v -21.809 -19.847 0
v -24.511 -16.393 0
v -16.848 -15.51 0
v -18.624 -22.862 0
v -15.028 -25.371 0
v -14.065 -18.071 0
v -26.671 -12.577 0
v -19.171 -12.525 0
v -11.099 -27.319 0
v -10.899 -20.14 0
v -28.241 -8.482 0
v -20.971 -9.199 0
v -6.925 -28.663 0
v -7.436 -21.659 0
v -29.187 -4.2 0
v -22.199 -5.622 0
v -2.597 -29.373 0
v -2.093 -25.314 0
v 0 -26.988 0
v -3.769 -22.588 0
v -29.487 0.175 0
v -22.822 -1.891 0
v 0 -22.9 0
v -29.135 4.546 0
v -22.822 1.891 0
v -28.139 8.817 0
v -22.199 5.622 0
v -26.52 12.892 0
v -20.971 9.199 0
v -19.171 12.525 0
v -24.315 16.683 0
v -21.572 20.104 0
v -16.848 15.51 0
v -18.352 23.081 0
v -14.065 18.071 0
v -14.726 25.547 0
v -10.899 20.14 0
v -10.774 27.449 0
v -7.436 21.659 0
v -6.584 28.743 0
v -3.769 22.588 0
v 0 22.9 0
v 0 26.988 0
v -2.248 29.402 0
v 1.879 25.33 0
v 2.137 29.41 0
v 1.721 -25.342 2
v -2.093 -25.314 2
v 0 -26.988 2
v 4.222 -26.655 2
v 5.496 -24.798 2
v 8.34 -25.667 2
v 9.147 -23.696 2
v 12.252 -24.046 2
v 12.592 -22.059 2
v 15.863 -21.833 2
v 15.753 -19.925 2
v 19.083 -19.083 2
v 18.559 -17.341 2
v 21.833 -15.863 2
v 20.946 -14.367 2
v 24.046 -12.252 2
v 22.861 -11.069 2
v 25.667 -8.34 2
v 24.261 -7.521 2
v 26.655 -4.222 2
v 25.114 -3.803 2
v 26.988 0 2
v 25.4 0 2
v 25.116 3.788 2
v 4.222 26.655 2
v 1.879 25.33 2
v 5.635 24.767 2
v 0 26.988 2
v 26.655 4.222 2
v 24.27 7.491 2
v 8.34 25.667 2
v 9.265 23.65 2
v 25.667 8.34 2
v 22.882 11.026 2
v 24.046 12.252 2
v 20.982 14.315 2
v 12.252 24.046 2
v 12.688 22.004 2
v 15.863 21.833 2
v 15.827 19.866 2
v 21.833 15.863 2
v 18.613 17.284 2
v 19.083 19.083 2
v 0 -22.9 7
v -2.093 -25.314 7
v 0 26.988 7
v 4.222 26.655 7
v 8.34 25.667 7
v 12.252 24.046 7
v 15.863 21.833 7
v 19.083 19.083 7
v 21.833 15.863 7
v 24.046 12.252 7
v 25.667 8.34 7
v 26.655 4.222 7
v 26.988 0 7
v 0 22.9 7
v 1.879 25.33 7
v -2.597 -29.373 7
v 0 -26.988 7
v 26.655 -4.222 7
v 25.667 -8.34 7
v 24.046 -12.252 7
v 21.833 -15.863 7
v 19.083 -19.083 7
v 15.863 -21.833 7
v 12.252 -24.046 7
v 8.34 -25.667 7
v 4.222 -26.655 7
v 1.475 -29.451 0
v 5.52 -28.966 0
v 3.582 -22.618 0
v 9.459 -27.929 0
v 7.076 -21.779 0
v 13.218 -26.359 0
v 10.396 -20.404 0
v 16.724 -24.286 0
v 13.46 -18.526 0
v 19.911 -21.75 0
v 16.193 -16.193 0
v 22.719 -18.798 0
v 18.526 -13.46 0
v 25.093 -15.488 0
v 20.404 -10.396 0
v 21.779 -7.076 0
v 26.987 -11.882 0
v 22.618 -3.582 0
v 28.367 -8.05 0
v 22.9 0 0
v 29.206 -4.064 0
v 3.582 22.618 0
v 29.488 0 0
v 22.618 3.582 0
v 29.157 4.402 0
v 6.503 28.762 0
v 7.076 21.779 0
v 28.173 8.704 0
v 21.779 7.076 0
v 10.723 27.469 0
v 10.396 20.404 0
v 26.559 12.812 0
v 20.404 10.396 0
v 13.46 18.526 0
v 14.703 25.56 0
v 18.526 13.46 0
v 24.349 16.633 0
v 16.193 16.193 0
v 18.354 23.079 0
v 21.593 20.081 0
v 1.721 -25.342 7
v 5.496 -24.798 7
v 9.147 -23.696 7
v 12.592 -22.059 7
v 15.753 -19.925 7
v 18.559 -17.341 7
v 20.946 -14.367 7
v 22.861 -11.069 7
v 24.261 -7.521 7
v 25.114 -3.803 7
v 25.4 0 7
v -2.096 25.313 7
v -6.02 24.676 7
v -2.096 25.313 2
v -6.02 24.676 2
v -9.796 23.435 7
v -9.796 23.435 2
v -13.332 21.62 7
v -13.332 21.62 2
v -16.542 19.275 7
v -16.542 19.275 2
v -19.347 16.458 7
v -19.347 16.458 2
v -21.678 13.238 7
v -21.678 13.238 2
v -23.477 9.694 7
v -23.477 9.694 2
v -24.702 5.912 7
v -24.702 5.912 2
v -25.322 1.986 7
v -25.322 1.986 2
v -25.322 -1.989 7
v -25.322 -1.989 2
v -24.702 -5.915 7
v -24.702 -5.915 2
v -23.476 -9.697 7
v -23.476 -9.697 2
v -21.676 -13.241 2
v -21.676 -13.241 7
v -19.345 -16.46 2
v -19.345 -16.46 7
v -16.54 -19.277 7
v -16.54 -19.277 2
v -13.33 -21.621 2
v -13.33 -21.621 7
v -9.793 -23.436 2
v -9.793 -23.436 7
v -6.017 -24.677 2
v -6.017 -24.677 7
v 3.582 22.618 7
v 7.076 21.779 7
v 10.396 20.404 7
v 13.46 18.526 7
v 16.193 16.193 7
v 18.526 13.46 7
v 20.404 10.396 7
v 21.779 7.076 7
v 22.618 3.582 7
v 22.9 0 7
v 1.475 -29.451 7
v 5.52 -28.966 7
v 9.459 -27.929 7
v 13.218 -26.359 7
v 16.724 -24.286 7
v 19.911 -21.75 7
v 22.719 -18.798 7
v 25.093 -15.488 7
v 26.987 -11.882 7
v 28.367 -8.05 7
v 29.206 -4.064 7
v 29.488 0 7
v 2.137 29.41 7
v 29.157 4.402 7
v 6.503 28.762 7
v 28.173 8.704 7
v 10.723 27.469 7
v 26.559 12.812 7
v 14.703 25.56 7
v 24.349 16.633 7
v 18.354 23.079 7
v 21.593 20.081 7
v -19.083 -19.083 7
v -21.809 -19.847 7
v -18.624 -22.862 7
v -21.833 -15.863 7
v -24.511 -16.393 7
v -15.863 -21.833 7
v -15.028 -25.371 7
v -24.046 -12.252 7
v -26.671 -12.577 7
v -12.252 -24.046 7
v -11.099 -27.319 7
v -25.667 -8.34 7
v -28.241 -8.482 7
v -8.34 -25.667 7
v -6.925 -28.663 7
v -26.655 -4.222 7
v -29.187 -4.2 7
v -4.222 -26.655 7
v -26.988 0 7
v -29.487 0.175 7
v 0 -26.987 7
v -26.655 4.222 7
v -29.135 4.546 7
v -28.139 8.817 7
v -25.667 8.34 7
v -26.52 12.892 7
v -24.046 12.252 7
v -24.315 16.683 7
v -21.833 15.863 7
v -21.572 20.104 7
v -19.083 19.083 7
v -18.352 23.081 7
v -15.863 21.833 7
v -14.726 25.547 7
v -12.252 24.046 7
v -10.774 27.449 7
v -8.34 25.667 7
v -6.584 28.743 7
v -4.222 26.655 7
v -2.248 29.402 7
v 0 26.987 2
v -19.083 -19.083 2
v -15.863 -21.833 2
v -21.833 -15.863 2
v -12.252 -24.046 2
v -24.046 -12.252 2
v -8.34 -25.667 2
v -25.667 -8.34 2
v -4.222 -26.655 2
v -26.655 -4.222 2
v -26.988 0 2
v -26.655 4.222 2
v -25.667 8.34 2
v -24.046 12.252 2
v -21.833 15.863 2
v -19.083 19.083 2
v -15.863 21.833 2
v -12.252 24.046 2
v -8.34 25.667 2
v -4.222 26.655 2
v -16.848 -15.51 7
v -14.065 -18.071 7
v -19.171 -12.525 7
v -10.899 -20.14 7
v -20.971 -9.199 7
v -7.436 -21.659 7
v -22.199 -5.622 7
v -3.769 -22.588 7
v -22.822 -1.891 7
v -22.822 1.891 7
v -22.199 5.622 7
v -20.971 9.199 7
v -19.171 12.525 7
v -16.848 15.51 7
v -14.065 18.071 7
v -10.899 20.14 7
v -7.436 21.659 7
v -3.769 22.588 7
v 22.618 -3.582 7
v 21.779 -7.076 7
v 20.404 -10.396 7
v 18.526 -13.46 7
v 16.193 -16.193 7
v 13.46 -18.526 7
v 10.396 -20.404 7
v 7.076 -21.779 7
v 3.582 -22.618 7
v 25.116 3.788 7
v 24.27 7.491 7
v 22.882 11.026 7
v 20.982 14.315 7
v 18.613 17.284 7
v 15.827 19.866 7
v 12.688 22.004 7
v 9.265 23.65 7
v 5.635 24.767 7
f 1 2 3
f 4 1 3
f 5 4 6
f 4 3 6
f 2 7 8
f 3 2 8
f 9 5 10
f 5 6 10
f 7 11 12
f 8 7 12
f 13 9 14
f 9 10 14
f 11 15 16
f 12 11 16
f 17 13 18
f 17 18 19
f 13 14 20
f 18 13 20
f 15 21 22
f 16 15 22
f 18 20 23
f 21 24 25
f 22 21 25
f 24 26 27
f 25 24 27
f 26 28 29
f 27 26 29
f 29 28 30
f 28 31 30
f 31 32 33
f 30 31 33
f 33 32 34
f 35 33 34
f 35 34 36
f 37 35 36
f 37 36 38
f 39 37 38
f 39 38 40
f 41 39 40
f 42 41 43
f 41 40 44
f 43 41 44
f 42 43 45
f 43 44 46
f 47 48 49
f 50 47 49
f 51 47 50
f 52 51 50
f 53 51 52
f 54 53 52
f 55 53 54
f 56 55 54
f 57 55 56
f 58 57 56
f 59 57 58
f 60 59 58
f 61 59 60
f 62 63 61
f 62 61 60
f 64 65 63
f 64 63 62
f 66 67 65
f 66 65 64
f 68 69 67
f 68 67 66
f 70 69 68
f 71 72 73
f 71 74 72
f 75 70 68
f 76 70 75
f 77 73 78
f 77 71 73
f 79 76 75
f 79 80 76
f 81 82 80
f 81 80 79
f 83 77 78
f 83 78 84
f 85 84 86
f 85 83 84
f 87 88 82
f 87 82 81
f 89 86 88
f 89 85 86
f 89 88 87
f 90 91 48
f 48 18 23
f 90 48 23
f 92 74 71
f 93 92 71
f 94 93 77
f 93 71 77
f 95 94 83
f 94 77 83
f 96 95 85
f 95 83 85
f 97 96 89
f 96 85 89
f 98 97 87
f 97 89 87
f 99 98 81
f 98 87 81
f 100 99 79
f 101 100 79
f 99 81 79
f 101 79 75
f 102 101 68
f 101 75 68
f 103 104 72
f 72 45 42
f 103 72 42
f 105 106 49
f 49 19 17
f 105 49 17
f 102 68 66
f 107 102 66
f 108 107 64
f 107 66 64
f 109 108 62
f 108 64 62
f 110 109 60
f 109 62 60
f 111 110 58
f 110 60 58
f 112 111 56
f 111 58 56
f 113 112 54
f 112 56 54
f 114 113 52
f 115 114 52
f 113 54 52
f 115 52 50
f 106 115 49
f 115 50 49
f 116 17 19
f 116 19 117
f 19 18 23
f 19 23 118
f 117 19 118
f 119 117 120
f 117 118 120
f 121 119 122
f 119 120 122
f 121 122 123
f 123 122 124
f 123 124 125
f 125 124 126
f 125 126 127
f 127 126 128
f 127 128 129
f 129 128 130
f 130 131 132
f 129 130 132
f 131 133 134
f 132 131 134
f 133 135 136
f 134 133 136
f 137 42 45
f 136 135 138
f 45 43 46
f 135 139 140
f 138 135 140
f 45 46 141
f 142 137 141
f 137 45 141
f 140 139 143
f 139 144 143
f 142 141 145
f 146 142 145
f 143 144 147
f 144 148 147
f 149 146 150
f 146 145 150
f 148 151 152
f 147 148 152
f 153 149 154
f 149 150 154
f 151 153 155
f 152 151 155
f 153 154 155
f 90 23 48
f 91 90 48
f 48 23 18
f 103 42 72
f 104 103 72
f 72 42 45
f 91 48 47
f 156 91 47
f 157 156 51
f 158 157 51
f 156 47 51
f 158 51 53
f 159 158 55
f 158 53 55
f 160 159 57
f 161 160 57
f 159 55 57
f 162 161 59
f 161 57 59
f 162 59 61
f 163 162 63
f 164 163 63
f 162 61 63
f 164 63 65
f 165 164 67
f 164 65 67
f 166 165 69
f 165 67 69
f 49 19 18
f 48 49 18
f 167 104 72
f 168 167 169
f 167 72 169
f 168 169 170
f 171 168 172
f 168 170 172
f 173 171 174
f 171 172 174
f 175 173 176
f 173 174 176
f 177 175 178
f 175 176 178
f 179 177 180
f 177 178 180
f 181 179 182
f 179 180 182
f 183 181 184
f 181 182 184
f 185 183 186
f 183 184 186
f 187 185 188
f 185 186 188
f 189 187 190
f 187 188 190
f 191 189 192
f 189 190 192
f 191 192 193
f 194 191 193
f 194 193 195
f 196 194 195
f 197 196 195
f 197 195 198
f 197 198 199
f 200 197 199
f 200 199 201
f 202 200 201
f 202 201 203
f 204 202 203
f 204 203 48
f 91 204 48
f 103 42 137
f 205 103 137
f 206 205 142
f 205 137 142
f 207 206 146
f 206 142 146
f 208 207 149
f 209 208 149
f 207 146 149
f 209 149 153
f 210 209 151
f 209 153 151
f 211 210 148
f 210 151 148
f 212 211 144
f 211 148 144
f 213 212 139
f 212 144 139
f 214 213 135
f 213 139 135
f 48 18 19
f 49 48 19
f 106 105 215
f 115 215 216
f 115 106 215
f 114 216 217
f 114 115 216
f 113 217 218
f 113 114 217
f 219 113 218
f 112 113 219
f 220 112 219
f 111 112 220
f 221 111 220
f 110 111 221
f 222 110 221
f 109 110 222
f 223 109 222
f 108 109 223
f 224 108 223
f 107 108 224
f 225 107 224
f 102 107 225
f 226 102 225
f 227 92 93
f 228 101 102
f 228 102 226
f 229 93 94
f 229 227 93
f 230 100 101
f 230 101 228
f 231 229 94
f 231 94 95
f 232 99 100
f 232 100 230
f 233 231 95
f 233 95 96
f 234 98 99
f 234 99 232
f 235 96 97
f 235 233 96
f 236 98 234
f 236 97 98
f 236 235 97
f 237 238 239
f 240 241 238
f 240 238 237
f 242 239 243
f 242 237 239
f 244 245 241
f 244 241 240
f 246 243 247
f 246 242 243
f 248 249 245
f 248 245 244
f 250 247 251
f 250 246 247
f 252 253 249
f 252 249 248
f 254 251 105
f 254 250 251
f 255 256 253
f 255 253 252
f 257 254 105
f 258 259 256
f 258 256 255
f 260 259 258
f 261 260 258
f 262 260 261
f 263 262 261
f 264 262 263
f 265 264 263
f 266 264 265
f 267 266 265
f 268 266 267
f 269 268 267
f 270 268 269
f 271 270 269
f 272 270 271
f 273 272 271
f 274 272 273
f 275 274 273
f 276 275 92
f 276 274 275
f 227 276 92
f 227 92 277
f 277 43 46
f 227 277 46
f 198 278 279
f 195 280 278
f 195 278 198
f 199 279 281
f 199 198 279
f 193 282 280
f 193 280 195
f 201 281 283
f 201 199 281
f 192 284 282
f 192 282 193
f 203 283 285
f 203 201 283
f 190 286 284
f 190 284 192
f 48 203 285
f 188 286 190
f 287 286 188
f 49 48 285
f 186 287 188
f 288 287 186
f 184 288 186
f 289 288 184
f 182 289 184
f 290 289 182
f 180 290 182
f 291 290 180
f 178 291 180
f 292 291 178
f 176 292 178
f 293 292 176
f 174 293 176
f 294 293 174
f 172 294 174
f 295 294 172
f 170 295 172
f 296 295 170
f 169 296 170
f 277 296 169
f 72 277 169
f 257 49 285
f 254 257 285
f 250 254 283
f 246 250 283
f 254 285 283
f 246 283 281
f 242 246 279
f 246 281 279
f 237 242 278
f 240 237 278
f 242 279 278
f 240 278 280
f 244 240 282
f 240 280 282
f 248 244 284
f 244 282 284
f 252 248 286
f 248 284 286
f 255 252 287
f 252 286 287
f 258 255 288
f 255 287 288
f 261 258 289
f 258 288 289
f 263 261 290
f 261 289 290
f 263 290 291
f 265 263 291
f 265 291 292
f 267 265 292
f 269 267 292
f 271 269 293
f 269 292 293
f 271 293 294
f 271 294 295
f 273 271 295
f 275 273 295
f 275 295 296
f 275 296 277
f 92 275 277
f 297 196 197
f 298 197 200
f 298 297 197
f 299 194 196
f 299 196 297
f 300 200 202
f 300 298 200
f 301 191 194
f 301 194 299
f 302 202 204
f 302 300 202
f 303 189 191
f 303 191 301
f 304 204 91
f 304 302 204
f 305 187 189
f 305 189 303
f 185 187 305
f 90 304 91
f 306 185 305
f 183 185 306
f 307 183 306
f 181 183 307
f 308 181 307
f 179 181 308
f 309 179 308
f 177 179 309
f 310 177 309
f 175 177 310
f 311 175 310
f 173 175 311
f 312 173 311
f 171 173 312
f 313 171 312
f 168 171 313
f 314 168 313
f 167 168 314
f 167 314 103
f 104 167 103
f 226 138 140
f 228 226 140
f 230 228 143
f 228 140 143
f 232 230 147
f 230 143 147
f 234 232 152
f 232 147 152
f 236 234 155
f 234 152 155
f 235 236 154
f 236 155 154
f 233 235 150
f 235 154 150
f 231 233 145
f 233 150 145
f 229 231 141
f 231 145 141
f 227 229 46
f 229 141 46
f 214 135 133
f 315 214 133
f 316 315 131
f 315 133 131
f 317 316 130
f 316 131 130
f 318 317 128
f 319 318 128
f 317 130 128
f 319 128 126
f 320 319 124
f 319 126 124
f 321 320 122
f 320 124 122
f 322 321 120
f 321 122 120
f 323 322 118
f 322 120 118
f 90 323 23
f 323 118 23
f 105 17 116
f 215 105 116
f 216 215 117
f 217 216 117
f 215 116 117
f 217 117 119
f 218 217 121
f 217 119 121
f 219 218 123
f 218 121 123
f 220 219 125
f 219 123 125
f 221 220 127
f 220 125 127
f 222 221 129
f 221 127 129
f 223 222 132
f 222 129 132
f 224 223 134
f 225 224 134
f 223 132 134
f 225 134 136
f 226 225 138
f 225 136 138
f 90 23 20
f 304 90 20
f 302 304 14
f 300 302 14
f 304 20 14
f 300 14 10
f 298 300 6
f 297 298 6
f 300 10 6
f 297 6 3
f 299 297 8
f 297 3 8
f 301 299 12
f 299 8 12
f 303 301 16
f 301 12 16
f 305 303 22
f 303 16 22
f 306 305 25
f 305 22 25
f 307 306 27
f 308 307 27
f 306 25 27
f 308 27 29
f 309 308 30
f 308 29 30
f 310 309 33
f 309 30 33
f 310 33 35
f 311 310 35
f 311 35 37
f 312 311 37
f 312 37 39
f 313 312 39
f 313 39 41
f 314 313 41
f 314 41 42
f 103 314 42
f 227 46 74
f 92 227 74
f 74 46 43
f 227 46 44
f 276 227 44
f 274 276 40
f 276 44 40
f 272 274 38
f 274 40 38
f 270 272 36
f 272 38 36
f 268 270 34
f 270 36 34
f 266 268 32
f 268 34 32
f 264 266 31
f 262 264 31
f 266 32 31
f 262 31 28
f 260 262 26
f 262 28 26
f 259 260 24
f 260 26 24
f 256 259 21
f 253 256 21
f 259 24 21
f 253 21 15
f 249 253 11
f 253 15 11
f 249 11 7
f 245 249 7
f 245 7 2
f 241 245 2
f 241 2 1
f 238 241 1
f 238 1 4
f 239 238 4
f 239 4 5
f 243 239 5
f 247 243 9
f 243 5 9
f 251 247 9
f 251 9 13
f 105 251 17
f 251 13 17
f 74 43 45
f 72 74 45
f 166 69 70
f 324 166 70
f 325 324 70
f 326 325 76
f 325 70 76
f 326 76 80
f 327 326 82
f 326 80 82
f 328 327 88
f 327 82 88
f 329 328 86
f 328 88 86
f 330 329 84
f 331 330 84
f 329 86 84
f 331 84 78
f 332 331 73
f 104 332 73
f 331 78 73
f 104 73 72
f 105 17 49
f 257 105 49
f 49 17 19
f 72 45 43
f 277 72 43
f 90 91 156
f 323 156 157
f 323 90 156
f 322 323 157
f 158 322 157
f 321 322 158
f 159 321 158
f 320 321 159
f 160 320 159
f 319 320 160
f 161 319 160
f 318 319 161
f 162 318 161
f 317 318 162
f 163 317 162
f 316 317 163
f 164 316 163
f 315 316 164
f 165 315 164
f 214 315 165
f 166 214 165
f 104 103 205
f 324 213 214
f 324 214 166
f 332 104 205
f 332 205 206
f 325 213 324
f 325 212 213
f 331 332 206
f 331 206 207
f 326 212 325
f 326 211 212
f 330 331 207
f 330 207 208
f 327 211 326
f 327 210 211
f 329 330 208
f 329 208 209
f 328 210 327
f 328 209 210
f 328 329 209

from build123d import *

# Parameters (mm, degrees)
F1_DEPTH = 7
F2_DEPTH = 7
F3_DEPTH = 2
F4_DEPTH = 2


with BuildPart() as f1:
    # F0 (on Top) → F1 (new body)
    with BuildSketch(Plane.XY):
        with BuildLine():
            ThreePointArc((-2.0932090565, -25.3136025853), (17.2045414058, -18.6859239808), (25.4, 0))
            ThreePointArc((25.4, 0), (18.6128618146, 17.2835579402), (1.8786318842, 25.33043115))
            Line((1.8786318842, 25.33043115), (0, 22.9))
            ThreePointArc((0, 22.9), (16.1927452892, 16.1927452892), (22.9, 0))
            ThreePointArc((22.9, 0), (16.1927452892, -16.1927452892), (0, -22.9))
            Line((0, -22.9), (-2.0932090565, -25.3136025853))
        make_face()
    extrude(amount=F1_DEPTH)



with BuildPart() as f1b:
    # F0 (on Top) → F1, piece 2 (new body)
    with BuildSketch(Plane.XY):
        with BuildLine():
            Line((2.1367751989, 29.4099787147), (0, 26.9875))
            ThreePointArc((0, 26.9875), (19.0830442573, 19.0830442573), (26.9875, 0))
            ThreePointArc((26.9875, 0), (19.0830442573, -19.0830442573), (0, -26.9875))
            Line((0, -26.9875), (-2.5972767503, -29.3728924305))
            ThreePointArc((-2.5972767503, -29.3728924305), (19.9113718522, -21.7497109685), (29.4875, 0))
            ThreePointArc((29.4875, 0), (21.5930638739, 20.0811416206), (2.1367751989, 29.4099787147))
        make_face()
    extrude(amount=F1_DEPTH)


with BuildPart() as f2:
    # F0 (on Top) → F2 (new body)
    with BuildSketch(Plane.XY):
        with BuildLine():
            ThreePointArc((0, -26.9875), (-26.9875, 0), (0, 26.9875))
            Line((0, 26.9875), (2.1367751989, 29.4099787147))
            ThreePointArc((2.1367751989, 29.4099787147), (-29.3923374443, 2.3670986064), (-2.5972767503, -29.3728924305))
            Line((-2.5972767503, -29.3728924305), (0, -26.9875))
        make_face()
    extrude(amount=F2_DEPTH)



with BuildPart() as f2b:
    # F0 (on Top) → F2, piece 2 (new body)
    with BuildSketch(Plane.XY):
        with BuildLine():
            Line((0, 22.9), (1.8786318842, 25.33043115))
            ThreePointArc((1.8786318842, 25.33043115), (-25.3222441558, 1.9859382958), (-2.0932090565, -25.3136025853))
            Line((-2.0932090565, -25.3136025853), (0, -22.9))
            ThreePointArc((0, -22.9), (-22.9, 0), (0, 22.9))
        make_face()
    extrude(amount=F2_DEPTH)


with BuildPart() as f1_1:
    add(f1.part)

    add(f1b.part)  # F3 merges F1b
    # F0 (on Top) → F3 (join)
    with BuildSketch(Plane.XY):
        with BuildLine():
            ThreePointArc((1.8786318842, 25.33043115), (18.6128618146, 17.2835579402), (25.4, 0))
            ThreePointArc((25.4, 0), (17.2045414058, -18.6859239808), (-2.0932090565, -25.3136025853))
            Line((-2.0932090565, -25.3136025853), (0, -26.9875))
            ThreePointArc((0, -26.9875), (19.0830442573, -19.0830442573), (26.9875, 0))
            ThreePointArc((26.9875, 0), (19.0830442573, 19.0830442573), (0, 26.9875))
            Line((0, 26.9875), (1.8786318842, 25.33043115))
        make_face()
    extrude(amount=F3_DEPTH)


with BuildPart() as f2_1:
    add(f2.part)

    add(f2b.part)  # F4 merges F2b
    # F0 (on Top) → F4 (join)
    with BuildSketch(Plane.XY):
        with BuildLine():
            ThreePointArc((-2.0932090565, -25.3136025853), (-25.3222441558, 1.9859382958), (1.8786318842, 25.33043115))
            Line((1.8786318842, 25.33043115), (0, 26.9875))
            ThreePointArc((0, 26.9875), (-26.9875, 0), (0, -26.9875))
            Line((0, -26.9875), (-2.0932090565, -25.3136025853))
        make_face()
    extrude(amount=F4_DEPTH)


solid = Compound([f1_1.part, f2_1.part])
